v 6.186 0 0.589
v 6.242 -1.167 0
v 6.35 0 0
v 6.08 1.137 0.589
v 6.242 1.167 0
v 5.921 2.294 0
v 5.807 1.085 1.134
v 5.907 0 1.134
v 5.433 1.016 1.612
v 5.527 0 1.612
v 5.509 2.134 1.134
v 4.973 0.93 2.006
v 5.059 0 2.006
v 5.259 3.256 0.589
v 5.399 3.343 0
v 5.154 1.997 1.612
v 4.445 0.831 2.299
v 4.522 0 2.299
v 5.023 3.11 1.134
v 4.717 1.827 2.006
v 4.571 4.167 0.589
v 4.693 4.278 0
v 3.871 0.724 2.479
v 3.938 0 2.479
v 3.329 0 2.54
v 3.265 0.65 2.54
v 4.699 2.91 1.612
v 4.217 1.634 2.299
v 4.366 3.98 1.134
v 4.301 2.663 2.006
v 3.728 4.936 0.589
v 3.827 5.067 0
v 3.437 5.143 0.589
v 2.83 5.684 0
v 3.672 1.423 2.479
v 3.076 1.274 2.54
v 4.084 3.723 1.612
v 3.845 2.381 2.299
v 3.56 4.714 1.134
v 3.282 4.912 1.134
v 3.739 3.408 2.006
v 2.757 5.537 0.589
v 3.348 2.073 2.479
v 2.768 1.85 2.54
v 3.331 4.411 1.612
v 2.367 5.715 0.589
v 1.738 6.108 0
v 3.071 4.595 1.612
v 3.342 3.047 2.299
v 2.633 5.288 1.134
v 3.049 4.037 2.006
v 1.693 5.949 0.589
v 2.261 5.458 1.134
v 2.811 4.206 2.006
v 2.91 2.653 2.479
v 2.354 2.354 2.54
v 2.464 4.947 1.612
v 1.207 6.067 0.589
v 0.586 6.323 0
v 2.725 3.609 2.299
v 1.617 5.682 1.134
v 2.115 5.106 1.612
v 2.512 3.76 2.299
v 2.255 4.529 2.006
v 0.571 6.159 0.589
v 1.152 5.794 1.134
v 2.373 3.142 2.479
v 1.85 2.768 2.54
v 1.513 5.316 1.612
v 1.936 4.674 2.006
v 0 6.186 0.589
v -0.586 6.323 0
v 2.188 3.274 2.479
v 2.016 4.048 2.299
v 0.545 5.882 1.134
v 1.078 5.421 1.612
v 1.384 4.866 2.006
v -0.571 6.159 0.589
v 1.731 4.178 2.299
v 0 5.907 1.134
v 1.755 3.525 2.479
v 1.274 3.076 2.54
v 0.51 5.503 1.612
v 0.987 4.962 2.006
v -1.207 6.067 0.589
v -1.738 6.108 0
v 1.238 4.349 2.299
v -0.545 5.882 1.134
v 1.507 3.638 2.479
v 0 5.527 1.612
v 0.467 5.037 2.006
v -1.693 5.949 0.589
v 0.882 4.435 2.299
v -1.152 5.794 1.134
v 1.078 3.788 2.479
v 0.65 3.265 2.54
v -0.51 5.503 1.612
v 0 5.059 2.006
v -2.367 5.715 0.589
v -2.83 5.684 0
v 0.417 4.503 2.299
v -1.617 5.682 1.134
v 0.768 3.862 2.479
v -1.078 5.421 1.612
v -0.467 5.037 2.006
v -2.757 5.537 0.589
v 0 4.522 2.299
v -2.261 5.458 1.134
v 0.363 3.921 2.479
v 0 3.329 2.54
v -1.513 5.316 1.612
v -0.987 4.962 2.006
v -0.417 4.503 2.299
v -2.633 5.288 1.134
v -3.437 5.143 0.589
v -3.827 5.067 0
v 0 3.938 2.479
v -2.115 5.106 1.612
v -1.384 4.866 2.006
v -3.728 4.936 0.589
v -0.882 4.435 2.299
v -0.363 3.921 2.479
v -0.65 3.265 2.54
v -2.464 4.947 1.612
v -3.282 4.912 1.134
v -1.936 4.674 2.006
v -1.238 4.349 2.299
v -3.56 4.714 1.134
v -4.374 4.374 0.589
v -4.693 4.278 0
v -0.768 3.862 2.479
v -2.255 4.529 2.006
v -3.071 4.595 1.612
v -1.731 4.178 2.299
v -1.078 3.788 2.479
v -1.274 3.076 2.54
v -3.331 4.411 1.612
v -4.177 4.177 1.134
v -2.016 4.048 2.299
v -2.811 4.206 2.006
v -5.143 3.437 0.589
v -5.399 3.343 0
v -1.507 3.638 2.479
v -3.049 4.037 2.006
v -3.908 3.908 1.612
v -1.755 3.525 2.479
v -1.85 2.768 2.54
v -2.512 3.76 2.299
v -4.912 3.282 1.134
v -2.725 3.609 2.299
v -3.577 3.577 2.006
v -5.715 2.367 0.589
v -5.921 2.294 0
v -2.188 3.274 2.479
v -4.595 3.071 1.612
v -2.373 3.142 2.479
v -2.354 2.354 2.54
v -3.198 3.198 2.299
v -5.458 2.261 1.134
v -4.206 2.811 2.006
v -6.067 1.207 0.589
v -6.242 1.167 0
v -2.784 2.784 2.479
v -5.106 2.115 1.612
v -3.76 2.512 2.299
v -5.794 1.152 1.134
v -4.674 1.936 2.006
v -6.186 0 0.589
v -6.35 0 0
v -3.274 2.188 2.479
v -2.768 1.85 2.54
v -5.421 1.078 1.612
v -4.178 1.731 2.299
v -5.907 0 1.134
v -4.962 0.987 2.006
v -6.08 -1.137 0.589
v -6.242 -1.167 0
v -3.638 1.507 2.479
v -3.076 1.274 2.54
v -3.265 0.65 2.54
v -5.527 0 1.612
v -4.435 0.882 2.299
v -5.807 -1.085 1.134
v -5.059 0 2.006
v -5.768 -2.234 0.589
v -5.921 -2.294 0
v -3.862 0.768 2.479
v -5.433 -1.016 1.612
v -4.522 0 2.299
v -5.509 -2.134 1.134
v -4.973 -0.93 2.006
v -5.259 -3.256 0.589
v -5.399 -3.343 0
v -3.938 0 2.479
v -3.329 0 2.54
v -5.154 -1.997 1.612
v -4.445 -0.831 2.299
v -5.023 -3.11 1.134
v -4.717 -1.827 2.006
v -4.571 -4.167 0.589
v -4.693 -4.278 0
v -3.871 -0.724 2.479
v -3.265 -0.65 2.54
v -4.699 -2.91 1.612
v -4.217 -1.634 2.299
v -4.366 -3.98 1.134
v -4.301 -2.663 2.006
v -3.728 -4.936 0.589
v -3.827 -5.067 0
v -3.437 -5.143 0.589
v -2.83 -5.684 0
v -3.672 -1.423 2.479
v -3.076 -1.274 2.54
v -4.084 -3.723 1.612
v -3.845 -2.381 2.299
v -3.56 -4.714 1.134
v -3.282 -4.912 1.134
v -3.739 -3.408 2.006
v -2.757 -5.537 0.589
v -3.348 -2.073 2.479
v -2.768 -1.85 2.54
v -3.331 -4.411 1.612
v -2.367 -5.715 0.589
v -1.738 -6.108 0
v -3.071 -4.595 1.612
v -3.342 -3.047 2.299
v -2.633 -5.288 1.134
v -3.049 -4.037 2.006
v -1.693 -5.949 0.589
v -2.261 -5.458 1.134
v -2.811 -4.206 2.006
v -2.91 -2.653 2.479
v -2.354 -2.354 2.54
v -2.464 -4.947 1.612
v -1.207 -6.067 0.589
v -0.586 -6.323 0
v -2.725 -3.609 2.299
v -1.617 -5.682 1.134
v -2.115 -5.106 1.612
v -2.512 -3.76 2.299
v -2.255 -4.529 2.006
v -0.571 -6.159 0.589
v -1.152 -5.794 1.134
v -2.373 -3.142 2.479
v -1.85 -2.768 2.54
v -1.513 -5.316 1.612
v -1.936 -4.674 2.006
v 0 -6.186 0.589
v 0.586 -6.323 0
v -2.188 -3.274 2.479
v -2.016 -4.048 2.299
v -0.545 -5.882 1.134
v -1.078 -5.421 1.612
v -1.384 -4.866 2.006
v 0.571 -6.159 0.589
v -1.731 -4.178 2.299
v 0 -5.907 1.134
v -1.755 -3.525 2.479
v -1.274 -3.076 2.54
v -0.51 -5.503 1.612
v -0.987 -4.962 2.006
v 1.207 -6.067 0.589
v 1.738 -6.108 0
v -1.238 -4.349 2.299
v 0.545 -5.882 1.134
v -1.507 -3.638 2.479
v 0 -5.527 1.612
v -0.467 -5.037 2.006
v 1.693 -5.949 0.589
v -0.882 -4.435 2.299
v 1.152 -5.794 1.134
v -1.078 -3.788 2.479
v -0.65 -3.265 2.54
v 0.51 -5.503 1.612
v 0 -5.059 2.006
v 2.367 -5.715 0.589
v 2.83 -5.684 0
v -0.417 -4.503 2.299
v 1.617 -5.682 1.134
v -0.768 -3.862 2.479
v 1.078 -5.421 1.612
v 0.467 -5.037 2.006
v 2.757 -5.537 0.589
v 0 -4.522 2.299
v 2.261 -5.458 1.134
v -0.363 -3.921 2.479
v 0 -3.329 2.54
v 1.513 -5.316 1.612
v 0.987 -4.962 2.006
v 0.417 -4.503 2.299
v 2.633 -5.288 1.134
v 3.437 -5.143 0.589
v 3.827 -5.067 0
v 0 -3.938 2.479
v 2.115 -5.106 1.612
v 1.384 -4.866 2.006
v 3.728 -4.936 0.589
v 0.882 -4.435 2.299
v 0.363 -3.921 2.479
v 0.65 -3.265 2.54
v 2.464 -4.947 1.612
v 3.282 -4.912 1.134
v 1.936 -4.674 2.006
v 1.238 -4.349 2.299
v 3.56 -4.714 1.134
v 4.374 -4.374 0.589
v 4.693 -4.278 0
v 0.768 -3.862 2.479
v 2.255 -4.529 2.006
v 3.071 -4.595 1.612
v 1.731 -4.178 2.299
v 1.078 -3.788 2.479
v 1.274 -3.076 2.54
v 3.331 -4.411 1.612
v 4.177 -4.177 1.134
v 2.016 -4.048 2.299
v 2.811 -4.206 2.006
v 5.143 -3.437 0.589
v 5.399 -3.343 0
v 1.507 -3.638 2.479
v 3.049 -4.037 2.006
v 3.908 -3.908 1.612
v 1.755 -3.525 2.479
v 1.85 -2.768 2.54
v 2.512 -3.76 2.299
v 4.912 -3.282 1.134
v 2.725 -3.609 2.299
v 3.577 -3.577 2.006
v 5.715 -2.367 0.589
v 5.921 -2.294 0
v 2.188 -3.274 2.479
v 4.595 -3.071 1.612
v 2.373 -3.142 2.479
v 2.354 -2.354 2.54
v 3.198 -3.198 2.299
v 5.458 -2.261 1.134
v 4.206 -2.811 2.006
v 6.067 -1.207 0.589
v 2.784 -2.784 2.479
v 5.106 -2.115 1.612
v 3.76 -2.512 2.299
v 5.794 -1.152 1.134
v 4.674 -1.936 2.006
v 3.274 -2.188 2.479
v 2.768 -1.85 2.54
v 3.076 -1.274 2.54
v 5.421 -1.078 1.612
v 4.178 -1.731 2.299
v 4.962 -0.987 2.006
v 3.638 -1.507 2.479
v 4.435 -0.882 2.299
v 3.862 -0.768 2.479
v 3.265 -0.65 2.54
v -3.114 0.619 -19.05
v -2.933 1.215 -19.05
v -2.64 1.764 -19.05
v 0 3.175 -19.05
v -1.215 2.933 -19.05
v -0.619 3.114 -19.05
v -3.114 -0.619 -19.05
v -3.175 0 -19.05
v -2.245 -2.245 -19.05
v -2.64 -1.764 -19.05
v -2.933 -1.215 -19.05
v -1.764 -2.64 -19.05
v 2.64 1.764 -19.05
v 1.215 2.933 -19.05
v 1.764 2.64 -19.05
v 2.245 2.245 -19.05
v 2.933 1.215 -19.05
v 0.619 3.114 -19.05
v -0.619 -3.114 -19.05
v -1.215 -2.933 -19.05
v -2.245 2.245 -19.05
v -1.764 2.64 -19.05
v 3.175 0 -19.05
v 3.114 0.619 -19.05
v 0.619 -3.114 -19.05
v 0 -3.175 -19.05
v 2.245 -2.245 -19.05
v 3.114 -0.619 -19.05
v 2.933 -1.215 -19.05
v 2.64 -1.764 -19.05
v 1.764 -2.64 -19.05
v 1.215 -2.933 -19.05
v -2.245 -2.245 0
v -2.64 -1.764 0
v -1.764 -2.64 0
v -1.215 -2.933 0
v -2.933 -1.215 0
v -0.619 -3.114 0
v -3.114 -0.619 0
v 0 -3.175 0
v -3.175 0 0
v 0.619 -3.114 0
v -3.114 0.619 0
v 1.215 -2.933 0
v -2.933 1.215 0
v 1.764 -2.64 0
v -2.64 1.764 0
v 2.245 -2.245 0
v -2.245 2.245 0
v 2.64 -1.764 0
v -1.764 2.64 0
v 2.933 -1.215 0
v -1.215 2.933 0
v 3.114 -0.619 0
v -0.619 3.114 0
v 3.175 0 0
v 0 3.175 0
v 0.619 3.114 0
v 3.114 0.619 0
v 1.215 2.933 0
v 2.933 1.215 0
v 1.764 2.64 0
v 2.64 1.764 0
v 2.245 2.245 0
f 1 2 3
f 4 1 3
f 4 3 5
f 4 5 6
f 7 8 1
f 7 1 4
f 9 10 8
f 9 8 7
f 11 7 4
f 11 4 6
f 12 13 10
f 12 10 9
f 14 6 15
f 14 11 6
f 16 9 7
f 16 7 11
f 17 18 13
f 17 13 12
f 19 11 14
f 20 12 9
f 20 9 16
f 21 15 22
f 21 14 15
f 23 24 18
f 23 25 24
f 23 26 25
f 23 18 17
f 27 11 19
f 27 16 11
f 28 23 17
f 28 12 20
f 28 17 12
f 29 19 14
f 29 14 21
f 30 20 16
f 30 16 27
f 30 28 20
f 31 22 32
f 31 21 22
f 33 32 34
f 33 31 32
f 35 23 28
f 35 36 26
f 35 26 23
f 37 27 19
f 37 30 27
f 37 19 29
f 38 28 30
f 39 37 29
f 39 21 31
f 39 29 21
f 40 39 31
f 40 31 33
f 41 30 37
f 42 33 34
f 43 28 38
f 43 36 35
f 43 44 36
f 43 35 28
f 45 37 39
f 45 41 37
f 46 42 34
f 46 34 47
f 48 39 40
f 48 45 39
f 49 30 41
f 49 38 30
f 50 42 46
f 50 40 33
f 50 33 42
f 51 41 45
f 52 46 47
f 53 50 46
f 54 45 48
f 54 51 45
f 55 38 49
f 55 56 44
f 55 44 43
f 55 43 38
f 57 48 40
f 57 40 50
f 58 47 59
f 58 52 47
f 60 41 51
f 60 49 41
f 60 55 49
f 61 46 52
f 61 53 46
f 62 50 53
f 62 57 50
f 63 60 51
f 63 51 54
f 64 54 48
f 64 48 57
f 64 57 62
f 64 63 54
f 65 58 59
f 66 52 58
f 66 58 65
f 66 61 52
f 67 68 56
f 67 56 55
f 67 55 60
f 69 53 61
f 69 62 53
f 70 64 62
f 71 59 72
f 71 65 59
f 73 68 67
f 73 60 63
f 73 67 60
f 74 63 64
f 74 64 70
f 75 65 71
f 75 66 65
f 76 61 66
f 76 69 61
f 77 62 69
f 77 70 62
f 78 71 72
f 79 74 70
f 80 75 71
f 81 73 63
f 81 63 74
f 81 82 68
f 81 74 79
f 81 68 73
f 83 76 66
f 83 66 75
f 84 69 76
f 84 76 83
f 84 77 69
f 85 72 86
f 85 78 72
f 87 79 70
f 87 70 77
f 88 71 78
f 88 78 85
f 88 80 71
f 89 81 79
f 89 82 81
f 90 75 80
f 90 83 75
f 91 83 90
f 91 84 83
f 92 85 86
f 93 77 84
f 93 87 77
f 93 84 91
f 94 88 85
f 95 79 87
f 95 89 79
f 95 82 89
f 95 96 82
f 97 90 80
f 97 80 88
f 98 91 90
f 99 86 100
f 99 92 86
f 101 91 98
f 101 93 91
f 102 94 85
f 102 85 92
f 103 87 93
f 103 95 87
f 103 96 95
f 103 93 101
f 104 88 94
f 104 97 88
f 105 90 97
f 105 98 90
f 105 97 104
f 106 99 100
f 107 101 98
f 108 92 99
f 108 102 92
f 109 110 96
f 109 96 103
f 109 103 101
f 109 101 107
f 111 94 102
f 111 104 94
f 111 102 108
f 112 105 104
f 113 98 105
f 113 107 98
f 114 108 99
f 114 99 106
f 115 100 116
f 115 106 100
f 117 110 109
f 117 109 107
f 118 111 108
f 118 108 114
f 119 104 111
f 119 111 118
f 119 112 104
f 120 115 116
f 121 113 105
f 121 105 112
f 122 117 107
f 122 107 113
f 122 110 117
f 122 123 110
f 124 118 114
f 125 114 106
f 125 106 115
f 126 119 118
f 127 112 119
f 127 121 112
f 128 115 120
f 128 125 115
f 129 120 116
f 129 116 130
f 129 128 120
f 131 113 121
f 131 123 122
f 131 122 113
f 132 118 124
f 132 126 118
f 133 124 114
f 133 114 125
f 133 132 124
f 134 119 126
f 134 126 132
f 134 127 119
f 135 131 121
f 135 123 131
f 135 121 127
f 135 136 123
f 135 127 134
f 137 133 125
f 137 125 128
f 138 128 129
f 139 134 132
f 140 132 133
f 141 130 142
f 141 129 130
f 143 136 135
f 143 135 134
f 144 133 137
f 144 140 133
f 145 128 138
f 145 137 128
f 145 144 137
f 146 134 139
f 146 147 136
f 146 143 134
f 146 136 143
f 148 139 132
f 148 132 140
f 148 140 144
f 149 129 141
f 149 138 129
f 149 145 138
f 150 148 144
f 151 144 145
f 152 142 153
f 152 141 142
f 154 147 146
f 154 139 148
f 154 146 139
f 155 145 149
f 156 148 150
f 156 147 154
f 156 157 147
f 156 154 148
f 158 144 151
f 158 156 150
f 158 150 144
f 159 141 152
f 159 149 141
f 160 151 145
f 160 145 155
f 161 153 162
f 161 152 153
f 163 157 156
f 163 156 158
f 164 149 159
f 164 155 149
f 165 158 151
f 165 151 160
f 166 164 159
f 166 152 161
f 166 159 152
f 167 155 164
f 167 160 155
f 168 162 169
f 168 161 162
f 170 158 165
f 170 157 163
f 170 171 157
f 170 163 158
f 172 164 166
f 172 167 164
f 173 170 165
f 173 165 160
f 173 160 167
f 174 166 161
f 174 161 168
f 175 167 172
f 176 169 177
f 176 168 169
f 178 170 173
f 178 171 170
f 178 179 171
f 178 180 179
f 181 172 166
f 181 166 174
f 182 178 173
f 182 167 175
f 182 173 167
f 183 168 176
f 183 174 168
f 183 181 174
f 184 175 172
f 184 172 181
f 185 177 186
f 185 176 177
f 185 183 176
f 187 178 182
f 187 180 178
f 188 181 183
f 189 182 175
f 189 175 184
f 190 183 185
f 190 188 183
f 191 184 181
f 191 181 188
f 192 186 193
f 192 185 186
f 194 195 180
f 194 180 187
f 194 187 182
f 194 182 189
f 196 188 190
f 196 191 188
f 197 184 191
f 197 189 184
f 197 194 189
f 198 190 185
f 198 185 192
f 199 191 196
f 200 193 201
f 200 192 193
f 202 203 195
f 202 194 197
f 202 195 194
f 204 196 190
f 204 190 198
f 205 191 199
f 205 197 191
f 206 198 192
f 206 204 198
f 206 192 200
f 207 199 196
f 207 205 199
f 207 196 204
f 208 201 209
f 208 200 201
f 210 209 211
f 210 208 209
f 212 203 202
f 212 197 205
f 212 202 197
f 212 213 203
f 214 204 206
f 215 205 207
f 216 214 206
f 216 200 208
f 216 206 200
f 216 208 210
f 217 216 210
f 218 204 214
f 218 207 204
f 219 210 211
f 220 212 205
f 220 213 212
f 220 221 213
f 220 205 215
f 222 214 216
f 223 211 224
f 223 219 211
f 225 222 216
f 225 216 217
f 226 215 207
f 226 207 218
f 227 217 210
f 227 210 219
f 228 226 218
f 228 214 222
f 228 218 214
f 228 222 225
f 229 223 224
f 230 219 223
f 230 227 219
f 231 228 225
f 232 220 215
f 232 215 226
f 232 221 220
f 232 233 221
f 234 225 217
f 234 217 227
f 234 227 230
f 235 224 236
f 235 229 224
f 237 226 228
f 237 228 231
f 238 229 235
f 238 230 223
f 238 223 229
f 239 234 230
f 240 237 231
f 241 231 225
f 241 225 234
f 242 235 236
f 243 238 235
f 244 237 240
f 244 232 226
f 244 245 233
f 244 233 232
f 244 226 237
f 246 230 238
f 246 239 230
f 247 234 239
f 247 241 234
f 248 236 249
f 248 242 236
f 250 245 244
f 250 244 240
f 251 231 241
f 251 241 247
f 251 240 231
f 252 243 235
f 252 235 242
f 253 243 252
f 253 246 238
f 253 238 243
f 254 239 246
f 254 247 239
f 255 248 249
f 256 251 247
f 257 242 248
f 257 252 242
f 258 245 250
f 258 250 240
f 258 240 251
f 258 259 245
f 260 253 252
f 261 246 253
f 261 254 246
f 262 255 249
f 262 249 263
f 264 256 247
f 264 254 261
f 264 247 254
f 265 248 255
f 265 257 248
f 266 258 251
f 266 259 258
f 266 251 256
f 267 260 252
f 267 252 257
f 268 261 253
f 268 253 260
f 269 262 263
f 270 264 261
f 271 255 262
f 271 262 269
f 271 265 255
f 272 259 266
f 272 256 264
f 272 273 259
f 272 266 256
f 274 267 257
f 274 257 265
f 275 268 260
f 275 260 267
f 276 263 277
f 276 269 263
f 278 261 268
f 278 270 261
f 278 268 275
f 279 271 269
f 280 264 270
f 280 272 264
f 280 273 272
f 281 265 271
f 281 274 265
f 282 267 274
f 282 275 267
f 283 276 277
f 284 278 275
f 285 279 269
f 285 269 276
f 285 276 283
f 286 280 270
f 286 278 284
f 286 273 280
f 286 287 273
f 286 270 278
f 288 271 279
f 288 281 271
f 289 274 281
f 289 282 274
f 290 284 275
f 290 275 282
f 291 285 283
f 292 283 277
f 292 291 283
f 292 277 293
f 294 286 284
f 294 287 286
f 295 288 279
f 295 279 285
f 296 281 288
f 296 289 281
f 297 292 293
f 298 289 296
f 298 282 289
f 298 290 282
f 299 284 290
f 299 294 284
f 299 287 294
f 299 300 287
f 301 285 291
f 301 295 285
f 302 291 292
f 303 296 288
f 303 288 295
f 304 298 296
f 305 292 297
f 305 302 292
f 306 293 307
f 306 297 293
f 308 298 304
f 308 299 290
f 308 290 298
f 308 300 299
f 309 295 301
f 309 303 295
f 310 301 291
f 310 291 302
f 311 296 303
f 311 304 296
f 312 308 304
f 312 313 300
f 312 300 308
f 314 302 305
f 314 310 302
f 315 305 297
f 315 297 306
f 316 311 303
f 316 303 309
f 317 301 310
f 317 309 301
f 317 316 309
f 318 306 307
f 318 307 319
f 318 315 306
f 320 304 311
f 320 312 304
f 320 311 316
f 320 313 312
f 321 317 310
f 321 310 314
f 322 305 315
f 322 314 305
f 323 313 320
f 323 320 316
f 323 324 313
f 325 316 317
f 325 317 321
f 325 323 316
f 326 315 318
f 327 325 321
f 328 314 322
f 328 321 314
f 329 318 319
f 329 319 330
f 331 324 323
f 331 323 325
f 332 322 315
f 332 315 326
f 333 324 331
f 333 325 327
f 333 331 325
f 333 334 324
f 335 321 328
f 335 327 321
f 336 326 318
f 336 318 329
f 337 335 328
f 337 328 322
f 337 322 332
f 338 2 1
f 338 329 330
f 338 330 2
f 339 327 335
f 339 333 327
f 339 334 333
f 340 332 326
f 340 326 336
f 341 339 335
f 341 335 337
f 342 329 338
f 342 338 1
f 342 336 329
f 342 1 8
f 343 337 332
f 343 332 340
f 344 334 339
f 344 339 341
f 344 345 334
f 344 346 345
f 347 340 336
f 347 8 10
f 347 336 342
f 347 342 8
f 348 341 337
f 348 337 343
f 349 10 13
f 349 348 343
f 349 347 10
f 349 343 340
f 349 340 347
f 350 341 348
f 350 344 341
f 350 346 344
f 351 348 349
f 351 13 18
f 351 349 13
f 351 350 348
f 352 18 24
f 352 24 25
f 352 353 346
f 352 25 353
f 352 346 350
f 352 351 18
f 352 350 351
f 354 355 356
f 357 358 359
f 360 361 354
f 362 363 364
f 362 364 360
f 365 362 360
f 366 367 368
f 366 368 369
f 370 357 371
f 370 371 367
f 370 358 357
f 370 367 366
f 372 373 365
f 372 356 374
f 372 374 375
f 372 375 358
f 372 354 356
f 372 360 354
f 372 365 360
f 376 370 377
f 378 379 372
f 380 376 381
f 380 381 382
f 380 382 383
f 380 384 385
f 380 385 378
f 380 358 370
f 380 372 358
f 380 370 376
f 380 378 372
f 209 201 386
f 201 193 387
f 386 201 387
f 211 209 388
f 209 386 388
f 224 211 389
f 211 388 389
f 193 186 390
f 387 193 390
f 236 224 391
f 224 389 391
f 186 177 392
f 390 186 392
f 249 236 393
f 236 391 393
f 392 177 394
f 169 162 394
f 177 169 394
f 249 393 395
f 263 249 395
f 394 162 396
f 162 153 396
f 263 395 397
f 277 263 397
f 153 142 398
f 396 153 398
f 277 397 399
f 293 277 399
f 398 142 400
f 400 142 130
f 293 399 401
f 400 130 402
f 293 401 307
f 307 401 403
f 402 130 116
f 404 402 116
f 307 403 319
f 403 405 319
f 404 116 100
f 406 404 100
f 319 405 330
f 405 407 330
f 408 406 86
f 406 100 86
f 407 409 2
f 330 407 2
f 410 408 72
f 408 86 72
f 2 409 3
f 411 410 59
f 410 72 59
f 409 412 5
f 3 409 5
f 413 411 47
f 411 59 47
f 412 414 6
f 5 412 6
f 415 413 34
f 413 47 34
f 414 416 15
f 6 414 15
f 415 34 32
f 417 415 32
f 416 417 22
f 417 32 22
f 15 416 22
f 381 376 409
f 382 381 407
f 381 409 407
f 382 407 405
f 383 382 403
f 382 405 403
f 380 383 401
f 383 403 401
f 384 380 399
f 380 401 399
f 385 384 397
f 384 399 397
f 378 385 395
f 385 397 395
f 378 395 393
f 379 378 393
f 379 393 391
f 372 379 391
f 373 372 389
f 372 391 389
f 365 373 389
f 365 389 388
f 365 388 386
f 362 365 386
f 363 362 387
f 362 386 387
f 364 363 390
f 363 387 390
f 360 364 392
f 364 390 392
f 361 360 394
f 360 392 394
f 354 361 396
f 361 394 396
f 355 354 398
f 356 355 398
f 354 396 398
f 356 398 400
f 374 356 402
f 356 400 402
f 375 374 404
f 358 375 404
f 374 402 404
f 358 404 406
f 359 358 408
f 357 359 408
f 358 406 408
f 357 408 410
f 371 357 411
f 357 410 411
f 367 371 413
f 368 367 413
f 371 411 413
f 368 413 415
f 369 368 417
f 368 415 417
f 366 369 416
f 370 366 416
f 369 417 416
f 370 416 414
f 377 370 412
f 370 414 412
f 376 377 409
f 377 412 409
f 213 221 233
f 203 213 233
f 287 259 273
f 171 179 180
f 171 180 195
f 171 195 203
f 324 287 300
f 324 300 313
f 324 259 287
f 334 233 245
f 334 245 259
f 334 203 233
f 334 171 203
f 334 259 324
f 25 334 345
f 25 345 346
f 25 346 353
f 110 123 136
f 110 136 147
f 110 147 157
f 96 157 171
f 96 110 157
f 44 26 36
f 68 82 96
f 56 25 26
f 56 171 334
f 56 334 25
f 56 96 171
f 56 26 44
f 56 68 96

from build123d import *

# Parameters (mm, degrees)
F0_R     = 6.35
F1_DEPTH = 2.54
F3_R     = 3.175
F4_DEPTH = 19.05


# Not quite as in the source:
# - a fillet or chamfer that OpenCascade refuses, or shapes differently, is made with other operations: its cross-section is extruded or revolved along the edge and cut away or added


with BuildPart() as f1:
    # F0 (on Top) → F1 (new body)
    with BuildSketch(Plane.XY):
        Circle(F0_R)
    extrude(amount=F1_DEPTH)

    # F2: fillet of radius 3.0660512242 on 1 edges, made by hand

    # F2_s1 → F2_t2 (revolve, cut)
    with BuildSketch(Plane.XZ):
        with BuildLine():
            ThreePointArc((6.35, 0), (5.3027068749, 1.8206027884), (3.3294139279, 2.54))
            Line((3.3294139279, 2.54), (6.35, 2.54))
            Line((6.35, 2.54), (6.35, 0))
        make_face()
    revolve(axis=Axis((0, 0, 2.54), (0, 0, 1)), mode=Mode.SUBTRACT)

    # F3 (on face) → F4 (join)
    with BuildSketch(Plane(origin=(0, 0, 0), x_dir=(1, 0, 0), z_dir=(0, 0, -1))):
        Circle(F3_R)
    extrude(amount=F4_DEPTH)


solid = f1.part
